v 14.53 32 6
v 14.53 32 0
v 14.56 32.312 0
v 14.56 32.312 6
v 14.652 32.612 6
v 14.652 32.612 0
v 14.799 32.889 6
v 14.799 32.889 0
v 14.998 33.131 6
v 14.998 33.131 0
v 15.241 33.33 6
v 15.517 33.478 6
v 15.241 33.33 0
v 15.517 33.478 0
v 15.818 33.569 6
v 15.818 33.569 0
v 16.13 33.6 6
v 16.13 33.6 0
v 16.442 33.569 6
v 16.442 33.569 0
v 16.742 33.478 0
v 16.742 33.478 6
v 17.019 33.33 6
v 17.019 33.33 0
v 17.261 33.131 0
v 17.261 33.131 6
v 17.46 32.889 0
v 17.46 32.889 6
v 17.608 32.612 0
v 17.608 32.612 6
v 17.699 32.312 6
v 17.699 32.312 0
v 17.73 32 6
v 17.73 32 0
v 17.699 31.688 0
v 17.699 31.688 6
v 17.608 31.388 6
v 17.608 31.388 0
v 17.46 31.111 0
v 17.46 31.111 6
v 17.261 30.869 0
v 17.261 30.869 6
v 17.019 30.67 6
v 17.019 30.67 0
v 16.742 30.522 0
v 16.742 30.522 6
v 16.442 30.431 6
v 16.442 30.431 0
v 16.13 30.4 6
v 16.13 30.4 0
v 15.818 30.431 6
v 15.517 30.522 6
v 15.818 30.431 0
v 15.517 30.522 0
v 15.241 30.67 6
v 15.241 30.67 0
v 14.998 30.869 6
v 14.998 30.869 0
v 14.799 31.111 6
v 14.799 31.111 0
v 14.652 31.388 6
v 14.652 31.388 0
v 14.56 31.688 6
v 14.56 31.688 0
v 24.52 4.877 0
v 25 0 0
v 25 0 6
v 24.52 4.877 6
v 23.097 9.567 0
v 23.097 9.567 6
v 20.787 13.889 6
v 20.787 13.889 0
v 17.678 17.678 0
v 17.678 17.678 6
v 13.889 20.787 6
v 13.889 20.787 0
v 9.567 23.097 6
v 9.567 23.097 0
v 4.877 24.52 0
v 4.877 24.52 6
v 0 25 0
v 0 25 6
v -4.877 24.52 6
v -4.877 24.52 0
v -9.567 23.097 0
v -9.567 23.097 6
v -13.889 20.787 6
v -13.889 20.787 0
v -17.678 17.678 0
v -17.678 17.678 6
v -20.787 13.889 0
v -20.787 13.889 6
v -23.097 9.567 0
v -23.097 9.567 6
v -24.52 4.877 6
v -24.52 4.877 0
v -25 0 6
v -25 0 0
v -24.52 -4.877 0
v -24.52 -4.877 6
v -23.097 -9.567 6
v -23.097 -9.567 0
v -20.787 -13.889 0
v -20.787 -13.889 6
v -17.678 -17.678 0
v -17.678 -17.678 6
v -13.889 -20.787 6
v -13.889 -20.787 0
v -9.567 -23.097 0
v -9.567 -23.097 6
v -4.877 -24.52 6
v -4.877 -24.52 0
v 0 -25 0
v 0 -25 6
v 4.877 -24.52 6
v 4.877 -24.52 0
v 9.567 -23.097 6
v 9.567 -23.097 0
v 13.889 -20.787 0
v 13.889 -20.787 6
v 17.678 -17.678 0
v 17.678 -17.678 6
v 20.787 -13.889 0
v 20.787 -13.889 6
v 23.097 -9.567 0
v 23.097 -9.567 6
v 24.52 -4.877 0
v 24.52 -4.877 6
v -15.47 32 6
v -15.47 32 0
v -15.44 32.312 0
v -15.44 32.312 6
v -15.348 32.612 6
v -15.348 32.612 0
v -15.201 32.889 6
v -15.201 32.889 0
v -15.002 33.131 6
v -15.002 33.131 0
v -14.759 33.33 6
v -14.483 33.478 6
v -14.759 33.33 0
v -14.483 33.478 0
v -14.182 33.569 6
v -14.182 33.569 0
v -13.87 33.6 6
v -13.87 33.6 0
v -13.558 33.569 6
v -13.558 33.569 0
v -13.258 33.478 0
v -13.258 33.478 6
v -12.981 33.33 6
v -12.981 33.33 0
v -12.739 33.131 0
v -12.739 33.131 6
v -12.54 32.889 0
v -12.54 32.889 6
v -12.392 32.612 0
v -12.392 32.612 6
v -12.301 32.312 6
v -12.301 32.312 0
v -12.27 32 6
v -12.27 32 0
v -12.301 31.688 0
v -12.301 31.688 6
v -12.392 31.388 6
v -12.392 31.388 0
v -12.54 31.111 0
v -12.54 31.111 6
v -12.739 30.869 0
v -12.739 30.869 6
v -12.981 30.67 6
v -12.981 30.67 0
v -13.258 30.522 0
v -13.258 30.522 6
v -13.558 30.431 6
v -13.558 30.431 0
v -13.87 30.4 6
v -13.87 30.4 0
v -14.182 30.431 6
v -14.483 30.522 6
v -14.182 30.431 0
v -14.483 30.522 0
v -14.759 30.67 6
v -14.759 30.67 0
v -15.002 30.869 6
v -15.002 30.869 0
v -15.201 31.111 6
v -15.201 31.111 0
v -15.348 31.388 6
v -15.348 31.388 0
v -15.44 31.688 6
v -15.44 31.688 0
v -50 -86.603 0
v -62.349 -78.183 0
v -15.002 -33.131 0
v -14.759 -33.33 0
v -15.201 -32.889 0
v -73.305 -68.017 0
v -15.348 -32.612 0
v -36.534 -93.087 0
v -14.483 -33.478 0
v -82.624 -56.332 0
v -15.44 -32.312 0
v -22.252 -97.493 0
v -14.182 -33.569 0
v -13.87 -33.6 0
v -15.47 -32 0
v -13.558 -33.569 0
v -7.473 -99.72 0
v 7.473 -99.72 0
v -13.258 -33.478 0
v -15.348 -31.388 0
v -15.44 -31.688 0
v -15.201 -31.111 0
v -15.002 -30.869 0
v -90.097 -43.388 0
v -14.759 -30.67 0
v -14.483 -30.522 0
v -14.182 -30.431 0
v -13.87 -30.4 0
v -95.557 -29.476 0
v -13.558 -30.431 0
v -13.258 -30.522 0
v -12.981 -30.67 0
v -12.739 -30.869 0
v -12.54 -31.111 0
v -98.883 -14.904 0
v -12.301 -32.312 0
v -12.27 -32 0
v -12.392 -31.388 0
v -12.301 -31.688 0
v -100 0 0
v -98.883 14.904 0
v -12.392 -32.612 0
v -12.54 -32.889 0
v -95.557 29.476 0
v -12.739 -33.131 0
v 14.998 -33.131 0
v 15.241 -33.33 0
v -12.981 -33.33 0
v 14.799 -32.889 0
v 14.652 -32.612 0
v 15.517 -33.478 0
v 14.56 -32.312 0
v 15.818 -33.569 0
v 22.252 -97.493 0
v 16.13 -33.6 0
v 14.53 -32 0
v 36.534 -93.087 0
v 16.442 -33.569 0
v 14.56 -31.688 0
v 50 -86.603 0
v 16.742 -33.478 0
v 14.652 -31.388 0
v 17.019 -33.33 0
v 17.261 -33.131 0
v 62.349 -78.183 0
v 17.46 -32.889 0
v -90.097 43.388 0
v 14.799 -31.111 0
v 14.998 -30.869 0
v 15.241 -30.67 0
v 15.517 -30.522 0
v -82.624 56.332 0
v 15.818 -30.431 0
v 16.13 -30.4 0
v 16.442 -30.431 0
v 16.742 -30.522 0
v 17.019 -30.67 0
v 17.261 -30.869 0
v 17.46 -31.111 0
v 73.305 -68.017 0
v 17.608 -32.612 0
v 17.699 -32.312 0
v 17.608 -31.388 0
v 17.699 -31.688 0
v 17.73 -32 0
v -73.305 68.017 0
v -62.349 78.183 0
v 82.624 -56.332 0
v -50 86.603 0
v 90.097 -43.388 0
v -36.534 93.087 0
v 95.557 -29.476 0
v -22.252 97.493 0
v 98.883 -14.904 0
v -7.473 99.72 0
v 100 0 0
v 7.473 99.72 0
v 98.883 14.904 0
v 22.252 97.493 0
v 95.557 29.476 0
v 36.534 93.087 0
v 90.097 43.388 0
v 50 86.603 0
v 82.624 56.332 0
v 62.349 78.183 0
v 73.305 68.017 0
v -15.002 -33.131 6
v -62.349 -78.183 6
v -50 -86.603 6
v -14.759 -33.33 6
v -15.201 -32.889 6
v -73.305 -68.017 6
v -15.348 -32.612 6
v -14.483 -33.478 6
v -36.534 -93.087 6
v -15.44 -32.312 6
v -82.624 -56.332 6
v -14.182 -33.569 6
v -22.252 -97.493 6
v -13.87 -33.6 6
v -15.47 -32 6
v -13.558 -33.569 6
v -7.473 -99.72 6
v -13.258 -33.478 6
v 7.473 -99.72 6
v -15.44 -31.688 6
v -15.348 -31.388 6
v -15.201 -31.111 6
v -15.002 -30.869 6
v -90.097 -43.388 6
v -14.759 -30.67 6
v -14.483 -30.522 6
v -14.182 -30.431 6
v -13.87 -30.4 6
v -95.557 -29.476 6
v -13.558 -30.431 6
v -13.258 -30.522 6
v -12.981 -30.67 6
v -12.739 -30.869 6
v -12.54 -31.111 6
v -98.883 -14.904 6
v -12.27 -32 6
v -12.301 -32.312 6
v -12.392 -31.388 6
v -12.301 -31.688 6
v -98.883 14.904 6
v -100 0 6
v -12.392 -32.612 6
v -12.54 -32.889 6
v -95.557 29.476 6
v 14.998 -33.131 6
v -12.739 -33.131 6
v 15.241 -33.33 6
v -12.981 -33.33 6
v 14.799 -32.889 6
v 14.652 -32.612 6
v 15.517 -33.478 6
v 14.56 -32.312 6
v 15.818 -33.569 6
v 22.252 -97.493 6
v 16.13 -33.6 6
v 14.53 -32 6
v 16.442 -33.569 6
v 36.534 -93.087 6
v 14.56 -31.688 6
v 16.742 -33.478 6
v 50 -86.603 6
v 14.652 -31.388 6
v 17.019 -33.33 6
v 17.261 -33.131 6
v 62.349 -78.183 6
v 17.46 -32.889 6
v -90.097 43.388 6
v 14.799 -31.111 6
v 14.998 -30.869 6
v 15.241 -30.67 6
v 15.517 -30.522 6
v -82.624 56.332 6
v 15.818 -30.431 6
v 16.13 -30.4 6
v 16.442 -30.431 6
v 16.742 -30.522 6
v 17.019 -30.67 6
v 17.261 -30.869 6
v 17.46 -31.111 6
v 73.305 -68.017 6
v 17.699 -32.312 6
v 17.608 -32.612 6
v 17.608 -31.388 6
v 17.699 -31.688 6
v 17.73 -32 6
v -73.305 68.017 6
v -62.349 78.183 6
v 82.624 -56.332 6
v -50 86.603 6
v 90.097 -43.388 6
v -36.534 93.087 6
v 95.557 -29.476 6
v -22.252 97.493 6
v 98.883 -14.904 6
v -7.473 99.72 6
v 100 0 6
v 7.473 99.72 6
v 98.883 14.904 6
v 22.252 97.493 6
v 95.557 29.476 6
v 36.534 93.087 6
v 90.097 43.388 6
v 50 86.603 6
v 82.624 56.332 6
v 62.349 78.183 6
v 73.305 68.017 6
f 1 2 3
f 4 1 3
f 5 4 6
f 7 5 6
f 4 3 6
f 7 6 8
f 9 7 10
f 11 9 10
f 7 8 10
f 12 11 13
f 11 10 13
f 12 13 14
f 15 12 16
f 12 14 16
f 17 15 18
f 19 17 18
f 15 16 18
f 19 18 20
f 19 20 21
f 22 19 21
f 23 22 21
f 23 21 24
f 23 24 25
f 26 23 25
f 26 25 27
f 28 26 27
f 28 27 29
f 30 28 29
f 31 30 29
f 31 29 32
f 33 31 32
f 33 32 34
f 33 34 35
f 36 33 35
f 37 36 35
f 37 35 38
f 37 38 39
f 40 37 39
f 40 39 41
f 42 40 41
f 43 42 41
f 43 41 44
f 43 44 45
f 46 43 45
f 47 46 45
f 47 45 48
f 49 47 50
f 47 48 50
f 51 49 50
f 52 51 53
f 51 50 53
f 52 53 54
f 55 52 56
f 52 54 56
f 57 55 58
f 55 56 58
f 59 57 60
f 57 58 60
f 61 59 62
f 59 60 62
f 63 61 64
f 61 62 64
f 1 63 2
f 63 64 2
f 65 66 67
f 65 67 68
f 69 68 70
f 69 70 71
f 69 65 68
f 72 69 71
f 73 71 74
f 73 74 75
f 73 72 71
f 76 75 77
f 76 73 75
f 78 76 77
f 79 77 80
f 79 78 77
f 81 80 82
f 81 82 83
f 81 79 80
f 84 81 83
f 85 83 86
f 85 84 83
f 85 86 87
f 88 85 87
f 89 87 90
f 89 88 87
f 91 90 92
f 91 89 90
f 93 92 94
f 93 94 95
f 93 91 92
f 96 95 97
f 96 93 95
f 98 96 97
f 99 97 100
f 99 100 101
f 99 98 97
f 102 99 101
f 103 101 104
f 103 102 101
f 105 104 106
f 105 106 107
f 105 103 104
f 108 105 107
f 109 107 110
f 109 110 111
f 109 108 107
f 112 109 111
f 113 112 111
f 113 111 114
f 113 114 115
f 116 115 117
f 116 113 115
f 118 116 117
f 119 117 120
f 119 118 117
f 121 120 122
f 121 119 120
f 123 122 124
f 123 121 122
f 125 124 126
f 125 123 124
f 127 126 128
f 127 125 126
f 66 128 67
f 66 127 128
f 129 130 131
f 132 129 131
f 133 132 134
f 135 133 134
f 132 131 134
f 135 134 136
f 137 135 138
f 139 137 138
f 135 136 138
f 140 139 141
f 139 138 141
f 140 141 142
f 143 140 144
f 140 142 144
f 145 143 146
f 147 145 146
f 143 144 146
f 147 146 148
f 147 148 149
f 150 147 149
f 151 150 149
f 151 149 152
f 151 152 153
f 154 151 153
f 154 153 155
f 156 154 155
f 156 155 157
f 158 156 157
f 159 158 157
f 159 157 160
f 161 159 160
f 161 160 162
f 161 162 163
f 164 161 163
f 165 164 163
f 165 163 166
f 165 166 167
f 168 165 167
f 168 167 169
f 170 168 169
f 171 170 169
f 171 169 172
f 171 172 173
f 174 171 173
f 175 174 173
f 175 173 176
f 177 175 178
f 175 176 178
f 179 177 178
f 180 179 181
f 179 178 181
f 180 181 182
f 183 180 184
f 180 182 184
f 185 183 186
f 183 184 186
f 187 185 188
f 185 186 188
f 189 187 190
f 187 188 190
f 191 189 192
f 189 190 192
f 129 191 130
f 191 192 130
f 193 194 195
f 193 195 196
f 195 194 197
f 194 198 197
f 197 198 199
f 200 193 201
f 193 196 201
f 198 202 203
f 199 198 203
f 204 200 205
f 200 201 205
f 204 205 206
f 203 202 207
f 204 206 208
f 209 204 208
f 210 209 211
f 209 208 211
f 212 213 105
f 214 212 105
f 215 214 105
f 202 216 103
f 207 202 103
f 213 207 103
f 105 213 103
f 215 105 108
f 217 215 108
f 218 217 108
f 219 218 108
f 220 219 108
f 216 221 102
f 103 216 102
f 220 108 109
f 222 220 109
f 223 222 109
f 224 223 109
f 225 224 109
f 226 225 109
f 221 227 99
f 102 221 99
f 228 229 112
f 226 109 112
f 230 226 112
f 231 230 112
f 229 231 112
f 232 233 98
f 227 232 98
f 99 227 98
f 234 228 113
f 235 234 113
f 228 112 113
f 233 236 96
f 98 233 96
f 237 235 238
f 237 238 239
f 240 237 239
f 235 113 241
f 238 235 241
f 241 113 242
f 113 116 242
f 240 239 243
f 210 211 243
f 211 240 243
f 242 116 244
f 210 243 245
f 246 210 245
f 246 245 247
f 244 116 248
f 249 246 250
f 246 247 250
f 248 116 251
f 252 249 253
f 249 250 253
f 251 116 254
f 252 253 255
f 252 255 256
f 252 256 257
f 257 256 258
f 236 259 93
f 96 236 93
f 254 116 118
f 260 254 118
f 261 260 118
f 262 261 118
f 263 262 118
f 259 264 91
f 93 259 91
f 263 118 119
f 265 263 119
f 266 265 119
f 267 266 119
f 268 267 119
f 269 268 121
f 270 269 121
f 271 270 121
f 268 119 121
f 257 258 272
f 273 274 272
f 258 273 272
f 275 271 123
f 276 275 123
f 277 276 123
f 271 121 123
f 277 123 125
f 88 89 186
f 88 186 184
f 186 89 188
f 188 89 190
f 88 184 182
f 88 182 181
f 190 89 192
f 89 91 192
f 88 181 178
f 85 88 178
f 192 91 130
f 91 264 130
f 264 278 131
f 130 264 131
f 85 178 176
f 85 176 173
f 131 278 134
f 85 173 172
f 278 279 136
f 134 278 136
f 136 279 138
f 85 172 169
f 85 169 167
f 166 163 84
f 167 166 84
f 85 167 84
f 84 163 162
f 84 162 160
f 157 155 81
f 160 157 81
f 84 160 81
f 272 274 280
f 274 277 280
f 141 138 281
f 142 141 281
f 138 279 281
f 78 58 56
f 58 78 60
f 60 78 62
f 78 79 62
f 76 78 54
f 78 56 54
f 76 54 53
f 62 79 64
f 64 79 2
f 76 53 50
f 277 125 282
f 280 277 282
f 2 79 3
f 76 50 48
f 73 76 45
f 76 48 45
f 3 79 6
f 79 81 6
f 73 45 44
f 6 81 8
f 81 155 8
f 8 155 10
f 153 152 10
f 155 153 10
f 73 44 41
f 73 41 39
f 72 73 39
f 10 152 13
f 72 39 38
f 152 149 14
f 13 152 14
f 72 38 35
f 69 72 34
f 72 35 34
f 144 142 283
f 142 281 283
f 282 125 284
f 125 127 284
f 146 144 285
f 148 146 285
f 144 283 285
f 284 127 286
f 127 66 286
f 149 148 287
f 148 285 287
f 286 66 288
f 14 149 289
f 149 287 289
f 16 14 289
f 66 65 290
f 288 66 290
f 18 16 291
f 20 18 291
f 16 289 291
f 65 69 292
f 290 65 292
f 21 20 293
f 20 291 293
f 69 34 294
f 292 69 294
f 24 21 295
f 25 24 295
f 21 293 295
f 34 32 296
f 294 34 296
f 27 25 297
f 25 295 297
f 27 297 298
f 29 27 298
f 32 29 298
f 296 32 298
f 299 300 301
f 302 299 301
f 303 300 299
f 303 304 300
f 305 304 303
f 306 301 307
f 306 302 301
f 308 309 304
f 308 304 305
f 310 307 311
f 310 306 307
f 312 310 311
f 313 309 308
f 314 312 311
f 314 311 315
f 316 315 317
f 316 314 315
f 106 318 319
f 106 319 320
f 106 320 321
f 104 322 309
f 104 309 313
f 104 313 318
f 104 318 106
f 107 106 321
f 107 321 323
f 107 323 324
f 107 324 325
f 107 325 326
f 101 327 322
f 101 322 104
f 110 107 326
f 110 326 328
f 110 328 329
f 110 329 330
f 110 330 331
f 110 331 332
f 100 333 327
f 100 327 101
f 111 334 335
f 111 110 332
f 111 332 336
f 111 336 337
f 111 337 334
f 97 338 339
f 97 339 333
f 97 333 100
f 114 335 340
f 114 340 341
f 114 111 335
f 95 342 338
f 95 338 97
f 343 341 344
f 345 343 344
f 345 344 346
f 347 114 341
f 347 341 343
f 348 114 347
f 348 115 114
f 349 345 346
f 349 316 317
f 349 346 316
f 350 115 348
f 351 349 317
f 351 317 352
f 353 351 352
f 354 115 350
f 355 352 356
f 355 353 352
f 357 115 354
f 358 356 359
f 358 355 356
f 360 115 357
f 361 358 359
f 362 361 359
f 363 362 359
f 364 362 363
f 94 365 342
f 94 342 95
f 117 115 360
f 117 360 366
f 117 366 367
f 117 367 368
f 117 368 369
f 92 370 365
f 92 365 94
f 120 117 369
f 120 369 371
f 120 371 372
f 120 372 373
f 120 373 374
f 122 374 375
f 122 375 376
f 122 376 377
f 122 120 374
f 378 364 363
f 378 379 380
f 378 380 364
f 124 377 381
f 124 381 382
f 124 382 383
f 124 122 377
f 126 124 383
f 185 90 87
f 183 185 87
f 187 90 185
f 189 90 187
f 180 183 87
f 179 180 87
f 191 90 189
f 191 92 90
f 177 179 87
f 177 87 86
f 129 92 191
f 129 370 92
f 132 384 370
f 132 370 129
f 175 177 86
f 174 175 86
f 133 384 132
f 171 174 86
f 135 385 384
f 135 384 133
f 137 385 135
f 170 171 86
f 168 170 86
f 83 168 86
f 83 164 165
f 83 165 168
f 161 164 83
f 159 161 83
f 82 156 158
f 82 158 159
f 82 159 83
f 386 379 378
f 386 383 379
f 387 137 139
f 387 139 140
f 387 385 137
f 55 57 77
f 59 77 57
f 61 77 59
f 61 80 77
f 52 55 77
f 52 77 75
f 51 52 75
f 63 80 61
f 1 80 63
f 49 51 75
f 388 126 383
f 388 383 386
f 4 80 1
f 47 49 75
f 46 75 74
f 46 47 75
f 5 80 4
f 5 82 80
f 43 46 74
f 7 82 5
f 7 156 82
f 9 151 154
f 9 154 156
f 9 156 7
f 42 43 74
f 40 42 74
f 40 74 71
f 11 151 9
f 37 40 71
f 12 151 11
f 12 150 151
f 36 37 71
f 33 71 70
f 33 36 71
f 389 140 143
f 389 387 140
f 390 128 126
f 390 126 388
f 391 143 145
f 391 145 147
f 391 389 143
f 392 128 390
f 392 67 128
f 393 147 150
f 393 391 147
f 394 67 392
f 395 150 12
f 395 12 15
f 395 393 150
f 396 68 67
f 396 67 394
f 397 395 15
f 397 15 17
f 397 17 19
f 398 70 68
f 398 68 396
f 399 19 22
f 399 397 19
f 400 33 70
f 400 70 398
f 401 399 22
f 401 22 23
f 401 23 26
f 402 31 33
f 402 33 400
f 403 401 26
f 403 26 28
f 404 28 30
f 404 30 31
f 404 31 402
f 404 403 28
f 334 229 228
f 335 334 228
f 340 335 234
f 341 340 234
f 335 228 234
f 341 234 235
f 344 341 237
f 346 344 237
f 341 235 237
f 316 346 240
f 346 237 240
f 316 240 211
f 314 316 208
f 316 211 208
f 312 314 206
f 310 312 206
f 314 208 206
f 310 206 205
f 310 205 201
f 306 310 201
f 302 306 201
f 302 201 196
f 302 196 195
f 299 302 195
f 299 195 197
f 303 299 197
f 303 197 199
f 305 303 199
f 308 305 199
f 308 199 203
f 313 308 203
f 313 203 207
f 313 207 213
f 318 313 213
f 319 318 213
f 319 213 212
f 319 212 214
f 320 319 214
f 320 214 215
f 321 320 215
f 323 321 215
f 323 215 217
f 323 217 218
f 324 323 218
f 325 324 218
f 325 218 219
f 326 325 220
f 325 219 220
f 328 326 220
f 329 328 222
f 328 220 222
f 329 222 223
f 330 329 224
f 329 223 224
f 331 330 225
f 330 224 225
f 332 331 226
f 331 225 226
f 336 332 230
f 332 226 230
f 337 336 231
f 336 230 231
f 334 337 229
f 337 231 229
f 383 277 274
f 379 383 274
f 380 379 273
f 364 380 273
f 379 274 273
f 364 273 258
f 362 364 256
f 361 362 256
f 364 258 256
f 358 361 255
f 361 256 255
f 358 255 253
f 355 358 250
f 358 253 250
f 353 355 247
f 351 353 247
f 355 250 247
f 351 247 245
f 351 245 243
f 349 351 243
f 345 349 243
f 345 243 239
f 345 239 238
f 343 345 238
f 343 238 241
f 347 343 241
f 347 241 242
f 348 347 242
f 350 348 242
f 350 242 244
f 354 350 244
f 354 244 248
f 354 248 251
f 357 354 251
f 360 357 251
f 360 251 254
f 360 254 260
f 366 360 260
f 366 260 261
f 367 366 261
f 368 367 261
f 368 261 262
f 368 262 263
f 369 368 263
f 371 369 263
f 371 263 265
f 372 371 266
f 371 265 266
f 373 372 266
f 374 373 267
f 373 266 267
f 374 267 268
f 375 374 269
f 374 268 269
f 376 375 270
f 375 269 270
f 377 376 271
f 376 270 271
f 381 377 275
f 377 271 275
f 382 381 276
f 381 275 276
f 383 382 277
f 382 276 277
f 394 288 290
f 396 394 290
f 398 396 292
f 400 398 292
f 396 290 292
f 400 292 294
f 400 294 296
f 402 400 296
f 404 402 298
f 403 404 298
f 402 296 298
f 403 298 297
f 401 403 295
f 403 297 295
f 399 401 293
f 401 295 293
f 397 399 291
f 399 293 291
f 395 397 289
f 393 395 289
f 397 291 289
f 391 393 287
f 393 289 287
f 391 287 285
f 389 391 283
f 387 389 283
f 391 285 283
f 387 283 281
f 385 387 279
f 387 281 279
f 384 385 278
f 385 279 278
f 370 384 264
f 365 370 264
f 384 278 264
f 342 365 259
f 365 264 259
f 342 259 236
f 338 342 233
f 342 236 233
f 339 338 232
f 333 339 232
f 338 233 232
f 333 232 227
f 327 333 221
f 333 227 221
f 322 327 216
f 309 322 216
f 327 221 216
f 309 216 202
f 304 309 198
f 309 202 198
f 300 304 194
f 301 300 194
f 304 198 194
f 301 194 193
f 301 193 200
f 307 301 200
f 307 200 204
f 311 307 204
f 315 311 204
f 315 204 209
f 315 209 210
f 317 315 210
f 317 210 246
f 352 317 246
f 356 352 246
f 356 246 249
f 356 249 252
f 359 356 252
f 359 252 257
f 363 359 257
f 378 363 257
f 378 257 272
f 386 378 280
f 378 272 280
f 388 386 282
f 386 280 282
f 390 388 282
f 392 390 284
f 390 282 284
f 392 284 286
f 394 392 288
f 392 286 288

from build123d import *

# Parameters (mm, degrees)
SKETCH1_R           = 100
SKETCH1_R_2         = 25
BOSS_EXTRUDE1_DEPTH = 6
SKETCH2_R           = 1.6
CUT_EXTRUDE1_DEPTH  = 142.548578234


with BuildPart() as part:
    # Sketch1 → Boss-Extrude1 (new body)
    with BuildSketch(Plane.XY):
        Circle(SKETCH1_R)
        Circle(SKETCH1_R_2, mode=Mode.SUBTRACT)
    extrude(amount=BOSS_EXTRUDE1_DEPTH)

    # Sketch2 → Cut-Extrude1 (cut, through all)
    with BuildSketch(Plane(origin=(0, 0, 0), x_dir=(-1, 0, 0), z_dir=(0, 0, -1))):
        with Locations((-16.129709466, 32)):
            Circle(SKETCH2_R)
        with Locations((13.870290534, 32)):
            Circle(SKETCH2_R)
        with Locations(Location((13.870290534, -32, 0), (0, 0, 180))):
            Circle(SKETCH2_R)
        with Locations(Location((-16.129709466, -32, 0), (0, 0, 180))):
            Circle(SKETCH2_R)
    extrude(amount=-CUT_EXTRUDE1_DEPTH, mode=Mode.SUBTRACT)


solid = part.part
